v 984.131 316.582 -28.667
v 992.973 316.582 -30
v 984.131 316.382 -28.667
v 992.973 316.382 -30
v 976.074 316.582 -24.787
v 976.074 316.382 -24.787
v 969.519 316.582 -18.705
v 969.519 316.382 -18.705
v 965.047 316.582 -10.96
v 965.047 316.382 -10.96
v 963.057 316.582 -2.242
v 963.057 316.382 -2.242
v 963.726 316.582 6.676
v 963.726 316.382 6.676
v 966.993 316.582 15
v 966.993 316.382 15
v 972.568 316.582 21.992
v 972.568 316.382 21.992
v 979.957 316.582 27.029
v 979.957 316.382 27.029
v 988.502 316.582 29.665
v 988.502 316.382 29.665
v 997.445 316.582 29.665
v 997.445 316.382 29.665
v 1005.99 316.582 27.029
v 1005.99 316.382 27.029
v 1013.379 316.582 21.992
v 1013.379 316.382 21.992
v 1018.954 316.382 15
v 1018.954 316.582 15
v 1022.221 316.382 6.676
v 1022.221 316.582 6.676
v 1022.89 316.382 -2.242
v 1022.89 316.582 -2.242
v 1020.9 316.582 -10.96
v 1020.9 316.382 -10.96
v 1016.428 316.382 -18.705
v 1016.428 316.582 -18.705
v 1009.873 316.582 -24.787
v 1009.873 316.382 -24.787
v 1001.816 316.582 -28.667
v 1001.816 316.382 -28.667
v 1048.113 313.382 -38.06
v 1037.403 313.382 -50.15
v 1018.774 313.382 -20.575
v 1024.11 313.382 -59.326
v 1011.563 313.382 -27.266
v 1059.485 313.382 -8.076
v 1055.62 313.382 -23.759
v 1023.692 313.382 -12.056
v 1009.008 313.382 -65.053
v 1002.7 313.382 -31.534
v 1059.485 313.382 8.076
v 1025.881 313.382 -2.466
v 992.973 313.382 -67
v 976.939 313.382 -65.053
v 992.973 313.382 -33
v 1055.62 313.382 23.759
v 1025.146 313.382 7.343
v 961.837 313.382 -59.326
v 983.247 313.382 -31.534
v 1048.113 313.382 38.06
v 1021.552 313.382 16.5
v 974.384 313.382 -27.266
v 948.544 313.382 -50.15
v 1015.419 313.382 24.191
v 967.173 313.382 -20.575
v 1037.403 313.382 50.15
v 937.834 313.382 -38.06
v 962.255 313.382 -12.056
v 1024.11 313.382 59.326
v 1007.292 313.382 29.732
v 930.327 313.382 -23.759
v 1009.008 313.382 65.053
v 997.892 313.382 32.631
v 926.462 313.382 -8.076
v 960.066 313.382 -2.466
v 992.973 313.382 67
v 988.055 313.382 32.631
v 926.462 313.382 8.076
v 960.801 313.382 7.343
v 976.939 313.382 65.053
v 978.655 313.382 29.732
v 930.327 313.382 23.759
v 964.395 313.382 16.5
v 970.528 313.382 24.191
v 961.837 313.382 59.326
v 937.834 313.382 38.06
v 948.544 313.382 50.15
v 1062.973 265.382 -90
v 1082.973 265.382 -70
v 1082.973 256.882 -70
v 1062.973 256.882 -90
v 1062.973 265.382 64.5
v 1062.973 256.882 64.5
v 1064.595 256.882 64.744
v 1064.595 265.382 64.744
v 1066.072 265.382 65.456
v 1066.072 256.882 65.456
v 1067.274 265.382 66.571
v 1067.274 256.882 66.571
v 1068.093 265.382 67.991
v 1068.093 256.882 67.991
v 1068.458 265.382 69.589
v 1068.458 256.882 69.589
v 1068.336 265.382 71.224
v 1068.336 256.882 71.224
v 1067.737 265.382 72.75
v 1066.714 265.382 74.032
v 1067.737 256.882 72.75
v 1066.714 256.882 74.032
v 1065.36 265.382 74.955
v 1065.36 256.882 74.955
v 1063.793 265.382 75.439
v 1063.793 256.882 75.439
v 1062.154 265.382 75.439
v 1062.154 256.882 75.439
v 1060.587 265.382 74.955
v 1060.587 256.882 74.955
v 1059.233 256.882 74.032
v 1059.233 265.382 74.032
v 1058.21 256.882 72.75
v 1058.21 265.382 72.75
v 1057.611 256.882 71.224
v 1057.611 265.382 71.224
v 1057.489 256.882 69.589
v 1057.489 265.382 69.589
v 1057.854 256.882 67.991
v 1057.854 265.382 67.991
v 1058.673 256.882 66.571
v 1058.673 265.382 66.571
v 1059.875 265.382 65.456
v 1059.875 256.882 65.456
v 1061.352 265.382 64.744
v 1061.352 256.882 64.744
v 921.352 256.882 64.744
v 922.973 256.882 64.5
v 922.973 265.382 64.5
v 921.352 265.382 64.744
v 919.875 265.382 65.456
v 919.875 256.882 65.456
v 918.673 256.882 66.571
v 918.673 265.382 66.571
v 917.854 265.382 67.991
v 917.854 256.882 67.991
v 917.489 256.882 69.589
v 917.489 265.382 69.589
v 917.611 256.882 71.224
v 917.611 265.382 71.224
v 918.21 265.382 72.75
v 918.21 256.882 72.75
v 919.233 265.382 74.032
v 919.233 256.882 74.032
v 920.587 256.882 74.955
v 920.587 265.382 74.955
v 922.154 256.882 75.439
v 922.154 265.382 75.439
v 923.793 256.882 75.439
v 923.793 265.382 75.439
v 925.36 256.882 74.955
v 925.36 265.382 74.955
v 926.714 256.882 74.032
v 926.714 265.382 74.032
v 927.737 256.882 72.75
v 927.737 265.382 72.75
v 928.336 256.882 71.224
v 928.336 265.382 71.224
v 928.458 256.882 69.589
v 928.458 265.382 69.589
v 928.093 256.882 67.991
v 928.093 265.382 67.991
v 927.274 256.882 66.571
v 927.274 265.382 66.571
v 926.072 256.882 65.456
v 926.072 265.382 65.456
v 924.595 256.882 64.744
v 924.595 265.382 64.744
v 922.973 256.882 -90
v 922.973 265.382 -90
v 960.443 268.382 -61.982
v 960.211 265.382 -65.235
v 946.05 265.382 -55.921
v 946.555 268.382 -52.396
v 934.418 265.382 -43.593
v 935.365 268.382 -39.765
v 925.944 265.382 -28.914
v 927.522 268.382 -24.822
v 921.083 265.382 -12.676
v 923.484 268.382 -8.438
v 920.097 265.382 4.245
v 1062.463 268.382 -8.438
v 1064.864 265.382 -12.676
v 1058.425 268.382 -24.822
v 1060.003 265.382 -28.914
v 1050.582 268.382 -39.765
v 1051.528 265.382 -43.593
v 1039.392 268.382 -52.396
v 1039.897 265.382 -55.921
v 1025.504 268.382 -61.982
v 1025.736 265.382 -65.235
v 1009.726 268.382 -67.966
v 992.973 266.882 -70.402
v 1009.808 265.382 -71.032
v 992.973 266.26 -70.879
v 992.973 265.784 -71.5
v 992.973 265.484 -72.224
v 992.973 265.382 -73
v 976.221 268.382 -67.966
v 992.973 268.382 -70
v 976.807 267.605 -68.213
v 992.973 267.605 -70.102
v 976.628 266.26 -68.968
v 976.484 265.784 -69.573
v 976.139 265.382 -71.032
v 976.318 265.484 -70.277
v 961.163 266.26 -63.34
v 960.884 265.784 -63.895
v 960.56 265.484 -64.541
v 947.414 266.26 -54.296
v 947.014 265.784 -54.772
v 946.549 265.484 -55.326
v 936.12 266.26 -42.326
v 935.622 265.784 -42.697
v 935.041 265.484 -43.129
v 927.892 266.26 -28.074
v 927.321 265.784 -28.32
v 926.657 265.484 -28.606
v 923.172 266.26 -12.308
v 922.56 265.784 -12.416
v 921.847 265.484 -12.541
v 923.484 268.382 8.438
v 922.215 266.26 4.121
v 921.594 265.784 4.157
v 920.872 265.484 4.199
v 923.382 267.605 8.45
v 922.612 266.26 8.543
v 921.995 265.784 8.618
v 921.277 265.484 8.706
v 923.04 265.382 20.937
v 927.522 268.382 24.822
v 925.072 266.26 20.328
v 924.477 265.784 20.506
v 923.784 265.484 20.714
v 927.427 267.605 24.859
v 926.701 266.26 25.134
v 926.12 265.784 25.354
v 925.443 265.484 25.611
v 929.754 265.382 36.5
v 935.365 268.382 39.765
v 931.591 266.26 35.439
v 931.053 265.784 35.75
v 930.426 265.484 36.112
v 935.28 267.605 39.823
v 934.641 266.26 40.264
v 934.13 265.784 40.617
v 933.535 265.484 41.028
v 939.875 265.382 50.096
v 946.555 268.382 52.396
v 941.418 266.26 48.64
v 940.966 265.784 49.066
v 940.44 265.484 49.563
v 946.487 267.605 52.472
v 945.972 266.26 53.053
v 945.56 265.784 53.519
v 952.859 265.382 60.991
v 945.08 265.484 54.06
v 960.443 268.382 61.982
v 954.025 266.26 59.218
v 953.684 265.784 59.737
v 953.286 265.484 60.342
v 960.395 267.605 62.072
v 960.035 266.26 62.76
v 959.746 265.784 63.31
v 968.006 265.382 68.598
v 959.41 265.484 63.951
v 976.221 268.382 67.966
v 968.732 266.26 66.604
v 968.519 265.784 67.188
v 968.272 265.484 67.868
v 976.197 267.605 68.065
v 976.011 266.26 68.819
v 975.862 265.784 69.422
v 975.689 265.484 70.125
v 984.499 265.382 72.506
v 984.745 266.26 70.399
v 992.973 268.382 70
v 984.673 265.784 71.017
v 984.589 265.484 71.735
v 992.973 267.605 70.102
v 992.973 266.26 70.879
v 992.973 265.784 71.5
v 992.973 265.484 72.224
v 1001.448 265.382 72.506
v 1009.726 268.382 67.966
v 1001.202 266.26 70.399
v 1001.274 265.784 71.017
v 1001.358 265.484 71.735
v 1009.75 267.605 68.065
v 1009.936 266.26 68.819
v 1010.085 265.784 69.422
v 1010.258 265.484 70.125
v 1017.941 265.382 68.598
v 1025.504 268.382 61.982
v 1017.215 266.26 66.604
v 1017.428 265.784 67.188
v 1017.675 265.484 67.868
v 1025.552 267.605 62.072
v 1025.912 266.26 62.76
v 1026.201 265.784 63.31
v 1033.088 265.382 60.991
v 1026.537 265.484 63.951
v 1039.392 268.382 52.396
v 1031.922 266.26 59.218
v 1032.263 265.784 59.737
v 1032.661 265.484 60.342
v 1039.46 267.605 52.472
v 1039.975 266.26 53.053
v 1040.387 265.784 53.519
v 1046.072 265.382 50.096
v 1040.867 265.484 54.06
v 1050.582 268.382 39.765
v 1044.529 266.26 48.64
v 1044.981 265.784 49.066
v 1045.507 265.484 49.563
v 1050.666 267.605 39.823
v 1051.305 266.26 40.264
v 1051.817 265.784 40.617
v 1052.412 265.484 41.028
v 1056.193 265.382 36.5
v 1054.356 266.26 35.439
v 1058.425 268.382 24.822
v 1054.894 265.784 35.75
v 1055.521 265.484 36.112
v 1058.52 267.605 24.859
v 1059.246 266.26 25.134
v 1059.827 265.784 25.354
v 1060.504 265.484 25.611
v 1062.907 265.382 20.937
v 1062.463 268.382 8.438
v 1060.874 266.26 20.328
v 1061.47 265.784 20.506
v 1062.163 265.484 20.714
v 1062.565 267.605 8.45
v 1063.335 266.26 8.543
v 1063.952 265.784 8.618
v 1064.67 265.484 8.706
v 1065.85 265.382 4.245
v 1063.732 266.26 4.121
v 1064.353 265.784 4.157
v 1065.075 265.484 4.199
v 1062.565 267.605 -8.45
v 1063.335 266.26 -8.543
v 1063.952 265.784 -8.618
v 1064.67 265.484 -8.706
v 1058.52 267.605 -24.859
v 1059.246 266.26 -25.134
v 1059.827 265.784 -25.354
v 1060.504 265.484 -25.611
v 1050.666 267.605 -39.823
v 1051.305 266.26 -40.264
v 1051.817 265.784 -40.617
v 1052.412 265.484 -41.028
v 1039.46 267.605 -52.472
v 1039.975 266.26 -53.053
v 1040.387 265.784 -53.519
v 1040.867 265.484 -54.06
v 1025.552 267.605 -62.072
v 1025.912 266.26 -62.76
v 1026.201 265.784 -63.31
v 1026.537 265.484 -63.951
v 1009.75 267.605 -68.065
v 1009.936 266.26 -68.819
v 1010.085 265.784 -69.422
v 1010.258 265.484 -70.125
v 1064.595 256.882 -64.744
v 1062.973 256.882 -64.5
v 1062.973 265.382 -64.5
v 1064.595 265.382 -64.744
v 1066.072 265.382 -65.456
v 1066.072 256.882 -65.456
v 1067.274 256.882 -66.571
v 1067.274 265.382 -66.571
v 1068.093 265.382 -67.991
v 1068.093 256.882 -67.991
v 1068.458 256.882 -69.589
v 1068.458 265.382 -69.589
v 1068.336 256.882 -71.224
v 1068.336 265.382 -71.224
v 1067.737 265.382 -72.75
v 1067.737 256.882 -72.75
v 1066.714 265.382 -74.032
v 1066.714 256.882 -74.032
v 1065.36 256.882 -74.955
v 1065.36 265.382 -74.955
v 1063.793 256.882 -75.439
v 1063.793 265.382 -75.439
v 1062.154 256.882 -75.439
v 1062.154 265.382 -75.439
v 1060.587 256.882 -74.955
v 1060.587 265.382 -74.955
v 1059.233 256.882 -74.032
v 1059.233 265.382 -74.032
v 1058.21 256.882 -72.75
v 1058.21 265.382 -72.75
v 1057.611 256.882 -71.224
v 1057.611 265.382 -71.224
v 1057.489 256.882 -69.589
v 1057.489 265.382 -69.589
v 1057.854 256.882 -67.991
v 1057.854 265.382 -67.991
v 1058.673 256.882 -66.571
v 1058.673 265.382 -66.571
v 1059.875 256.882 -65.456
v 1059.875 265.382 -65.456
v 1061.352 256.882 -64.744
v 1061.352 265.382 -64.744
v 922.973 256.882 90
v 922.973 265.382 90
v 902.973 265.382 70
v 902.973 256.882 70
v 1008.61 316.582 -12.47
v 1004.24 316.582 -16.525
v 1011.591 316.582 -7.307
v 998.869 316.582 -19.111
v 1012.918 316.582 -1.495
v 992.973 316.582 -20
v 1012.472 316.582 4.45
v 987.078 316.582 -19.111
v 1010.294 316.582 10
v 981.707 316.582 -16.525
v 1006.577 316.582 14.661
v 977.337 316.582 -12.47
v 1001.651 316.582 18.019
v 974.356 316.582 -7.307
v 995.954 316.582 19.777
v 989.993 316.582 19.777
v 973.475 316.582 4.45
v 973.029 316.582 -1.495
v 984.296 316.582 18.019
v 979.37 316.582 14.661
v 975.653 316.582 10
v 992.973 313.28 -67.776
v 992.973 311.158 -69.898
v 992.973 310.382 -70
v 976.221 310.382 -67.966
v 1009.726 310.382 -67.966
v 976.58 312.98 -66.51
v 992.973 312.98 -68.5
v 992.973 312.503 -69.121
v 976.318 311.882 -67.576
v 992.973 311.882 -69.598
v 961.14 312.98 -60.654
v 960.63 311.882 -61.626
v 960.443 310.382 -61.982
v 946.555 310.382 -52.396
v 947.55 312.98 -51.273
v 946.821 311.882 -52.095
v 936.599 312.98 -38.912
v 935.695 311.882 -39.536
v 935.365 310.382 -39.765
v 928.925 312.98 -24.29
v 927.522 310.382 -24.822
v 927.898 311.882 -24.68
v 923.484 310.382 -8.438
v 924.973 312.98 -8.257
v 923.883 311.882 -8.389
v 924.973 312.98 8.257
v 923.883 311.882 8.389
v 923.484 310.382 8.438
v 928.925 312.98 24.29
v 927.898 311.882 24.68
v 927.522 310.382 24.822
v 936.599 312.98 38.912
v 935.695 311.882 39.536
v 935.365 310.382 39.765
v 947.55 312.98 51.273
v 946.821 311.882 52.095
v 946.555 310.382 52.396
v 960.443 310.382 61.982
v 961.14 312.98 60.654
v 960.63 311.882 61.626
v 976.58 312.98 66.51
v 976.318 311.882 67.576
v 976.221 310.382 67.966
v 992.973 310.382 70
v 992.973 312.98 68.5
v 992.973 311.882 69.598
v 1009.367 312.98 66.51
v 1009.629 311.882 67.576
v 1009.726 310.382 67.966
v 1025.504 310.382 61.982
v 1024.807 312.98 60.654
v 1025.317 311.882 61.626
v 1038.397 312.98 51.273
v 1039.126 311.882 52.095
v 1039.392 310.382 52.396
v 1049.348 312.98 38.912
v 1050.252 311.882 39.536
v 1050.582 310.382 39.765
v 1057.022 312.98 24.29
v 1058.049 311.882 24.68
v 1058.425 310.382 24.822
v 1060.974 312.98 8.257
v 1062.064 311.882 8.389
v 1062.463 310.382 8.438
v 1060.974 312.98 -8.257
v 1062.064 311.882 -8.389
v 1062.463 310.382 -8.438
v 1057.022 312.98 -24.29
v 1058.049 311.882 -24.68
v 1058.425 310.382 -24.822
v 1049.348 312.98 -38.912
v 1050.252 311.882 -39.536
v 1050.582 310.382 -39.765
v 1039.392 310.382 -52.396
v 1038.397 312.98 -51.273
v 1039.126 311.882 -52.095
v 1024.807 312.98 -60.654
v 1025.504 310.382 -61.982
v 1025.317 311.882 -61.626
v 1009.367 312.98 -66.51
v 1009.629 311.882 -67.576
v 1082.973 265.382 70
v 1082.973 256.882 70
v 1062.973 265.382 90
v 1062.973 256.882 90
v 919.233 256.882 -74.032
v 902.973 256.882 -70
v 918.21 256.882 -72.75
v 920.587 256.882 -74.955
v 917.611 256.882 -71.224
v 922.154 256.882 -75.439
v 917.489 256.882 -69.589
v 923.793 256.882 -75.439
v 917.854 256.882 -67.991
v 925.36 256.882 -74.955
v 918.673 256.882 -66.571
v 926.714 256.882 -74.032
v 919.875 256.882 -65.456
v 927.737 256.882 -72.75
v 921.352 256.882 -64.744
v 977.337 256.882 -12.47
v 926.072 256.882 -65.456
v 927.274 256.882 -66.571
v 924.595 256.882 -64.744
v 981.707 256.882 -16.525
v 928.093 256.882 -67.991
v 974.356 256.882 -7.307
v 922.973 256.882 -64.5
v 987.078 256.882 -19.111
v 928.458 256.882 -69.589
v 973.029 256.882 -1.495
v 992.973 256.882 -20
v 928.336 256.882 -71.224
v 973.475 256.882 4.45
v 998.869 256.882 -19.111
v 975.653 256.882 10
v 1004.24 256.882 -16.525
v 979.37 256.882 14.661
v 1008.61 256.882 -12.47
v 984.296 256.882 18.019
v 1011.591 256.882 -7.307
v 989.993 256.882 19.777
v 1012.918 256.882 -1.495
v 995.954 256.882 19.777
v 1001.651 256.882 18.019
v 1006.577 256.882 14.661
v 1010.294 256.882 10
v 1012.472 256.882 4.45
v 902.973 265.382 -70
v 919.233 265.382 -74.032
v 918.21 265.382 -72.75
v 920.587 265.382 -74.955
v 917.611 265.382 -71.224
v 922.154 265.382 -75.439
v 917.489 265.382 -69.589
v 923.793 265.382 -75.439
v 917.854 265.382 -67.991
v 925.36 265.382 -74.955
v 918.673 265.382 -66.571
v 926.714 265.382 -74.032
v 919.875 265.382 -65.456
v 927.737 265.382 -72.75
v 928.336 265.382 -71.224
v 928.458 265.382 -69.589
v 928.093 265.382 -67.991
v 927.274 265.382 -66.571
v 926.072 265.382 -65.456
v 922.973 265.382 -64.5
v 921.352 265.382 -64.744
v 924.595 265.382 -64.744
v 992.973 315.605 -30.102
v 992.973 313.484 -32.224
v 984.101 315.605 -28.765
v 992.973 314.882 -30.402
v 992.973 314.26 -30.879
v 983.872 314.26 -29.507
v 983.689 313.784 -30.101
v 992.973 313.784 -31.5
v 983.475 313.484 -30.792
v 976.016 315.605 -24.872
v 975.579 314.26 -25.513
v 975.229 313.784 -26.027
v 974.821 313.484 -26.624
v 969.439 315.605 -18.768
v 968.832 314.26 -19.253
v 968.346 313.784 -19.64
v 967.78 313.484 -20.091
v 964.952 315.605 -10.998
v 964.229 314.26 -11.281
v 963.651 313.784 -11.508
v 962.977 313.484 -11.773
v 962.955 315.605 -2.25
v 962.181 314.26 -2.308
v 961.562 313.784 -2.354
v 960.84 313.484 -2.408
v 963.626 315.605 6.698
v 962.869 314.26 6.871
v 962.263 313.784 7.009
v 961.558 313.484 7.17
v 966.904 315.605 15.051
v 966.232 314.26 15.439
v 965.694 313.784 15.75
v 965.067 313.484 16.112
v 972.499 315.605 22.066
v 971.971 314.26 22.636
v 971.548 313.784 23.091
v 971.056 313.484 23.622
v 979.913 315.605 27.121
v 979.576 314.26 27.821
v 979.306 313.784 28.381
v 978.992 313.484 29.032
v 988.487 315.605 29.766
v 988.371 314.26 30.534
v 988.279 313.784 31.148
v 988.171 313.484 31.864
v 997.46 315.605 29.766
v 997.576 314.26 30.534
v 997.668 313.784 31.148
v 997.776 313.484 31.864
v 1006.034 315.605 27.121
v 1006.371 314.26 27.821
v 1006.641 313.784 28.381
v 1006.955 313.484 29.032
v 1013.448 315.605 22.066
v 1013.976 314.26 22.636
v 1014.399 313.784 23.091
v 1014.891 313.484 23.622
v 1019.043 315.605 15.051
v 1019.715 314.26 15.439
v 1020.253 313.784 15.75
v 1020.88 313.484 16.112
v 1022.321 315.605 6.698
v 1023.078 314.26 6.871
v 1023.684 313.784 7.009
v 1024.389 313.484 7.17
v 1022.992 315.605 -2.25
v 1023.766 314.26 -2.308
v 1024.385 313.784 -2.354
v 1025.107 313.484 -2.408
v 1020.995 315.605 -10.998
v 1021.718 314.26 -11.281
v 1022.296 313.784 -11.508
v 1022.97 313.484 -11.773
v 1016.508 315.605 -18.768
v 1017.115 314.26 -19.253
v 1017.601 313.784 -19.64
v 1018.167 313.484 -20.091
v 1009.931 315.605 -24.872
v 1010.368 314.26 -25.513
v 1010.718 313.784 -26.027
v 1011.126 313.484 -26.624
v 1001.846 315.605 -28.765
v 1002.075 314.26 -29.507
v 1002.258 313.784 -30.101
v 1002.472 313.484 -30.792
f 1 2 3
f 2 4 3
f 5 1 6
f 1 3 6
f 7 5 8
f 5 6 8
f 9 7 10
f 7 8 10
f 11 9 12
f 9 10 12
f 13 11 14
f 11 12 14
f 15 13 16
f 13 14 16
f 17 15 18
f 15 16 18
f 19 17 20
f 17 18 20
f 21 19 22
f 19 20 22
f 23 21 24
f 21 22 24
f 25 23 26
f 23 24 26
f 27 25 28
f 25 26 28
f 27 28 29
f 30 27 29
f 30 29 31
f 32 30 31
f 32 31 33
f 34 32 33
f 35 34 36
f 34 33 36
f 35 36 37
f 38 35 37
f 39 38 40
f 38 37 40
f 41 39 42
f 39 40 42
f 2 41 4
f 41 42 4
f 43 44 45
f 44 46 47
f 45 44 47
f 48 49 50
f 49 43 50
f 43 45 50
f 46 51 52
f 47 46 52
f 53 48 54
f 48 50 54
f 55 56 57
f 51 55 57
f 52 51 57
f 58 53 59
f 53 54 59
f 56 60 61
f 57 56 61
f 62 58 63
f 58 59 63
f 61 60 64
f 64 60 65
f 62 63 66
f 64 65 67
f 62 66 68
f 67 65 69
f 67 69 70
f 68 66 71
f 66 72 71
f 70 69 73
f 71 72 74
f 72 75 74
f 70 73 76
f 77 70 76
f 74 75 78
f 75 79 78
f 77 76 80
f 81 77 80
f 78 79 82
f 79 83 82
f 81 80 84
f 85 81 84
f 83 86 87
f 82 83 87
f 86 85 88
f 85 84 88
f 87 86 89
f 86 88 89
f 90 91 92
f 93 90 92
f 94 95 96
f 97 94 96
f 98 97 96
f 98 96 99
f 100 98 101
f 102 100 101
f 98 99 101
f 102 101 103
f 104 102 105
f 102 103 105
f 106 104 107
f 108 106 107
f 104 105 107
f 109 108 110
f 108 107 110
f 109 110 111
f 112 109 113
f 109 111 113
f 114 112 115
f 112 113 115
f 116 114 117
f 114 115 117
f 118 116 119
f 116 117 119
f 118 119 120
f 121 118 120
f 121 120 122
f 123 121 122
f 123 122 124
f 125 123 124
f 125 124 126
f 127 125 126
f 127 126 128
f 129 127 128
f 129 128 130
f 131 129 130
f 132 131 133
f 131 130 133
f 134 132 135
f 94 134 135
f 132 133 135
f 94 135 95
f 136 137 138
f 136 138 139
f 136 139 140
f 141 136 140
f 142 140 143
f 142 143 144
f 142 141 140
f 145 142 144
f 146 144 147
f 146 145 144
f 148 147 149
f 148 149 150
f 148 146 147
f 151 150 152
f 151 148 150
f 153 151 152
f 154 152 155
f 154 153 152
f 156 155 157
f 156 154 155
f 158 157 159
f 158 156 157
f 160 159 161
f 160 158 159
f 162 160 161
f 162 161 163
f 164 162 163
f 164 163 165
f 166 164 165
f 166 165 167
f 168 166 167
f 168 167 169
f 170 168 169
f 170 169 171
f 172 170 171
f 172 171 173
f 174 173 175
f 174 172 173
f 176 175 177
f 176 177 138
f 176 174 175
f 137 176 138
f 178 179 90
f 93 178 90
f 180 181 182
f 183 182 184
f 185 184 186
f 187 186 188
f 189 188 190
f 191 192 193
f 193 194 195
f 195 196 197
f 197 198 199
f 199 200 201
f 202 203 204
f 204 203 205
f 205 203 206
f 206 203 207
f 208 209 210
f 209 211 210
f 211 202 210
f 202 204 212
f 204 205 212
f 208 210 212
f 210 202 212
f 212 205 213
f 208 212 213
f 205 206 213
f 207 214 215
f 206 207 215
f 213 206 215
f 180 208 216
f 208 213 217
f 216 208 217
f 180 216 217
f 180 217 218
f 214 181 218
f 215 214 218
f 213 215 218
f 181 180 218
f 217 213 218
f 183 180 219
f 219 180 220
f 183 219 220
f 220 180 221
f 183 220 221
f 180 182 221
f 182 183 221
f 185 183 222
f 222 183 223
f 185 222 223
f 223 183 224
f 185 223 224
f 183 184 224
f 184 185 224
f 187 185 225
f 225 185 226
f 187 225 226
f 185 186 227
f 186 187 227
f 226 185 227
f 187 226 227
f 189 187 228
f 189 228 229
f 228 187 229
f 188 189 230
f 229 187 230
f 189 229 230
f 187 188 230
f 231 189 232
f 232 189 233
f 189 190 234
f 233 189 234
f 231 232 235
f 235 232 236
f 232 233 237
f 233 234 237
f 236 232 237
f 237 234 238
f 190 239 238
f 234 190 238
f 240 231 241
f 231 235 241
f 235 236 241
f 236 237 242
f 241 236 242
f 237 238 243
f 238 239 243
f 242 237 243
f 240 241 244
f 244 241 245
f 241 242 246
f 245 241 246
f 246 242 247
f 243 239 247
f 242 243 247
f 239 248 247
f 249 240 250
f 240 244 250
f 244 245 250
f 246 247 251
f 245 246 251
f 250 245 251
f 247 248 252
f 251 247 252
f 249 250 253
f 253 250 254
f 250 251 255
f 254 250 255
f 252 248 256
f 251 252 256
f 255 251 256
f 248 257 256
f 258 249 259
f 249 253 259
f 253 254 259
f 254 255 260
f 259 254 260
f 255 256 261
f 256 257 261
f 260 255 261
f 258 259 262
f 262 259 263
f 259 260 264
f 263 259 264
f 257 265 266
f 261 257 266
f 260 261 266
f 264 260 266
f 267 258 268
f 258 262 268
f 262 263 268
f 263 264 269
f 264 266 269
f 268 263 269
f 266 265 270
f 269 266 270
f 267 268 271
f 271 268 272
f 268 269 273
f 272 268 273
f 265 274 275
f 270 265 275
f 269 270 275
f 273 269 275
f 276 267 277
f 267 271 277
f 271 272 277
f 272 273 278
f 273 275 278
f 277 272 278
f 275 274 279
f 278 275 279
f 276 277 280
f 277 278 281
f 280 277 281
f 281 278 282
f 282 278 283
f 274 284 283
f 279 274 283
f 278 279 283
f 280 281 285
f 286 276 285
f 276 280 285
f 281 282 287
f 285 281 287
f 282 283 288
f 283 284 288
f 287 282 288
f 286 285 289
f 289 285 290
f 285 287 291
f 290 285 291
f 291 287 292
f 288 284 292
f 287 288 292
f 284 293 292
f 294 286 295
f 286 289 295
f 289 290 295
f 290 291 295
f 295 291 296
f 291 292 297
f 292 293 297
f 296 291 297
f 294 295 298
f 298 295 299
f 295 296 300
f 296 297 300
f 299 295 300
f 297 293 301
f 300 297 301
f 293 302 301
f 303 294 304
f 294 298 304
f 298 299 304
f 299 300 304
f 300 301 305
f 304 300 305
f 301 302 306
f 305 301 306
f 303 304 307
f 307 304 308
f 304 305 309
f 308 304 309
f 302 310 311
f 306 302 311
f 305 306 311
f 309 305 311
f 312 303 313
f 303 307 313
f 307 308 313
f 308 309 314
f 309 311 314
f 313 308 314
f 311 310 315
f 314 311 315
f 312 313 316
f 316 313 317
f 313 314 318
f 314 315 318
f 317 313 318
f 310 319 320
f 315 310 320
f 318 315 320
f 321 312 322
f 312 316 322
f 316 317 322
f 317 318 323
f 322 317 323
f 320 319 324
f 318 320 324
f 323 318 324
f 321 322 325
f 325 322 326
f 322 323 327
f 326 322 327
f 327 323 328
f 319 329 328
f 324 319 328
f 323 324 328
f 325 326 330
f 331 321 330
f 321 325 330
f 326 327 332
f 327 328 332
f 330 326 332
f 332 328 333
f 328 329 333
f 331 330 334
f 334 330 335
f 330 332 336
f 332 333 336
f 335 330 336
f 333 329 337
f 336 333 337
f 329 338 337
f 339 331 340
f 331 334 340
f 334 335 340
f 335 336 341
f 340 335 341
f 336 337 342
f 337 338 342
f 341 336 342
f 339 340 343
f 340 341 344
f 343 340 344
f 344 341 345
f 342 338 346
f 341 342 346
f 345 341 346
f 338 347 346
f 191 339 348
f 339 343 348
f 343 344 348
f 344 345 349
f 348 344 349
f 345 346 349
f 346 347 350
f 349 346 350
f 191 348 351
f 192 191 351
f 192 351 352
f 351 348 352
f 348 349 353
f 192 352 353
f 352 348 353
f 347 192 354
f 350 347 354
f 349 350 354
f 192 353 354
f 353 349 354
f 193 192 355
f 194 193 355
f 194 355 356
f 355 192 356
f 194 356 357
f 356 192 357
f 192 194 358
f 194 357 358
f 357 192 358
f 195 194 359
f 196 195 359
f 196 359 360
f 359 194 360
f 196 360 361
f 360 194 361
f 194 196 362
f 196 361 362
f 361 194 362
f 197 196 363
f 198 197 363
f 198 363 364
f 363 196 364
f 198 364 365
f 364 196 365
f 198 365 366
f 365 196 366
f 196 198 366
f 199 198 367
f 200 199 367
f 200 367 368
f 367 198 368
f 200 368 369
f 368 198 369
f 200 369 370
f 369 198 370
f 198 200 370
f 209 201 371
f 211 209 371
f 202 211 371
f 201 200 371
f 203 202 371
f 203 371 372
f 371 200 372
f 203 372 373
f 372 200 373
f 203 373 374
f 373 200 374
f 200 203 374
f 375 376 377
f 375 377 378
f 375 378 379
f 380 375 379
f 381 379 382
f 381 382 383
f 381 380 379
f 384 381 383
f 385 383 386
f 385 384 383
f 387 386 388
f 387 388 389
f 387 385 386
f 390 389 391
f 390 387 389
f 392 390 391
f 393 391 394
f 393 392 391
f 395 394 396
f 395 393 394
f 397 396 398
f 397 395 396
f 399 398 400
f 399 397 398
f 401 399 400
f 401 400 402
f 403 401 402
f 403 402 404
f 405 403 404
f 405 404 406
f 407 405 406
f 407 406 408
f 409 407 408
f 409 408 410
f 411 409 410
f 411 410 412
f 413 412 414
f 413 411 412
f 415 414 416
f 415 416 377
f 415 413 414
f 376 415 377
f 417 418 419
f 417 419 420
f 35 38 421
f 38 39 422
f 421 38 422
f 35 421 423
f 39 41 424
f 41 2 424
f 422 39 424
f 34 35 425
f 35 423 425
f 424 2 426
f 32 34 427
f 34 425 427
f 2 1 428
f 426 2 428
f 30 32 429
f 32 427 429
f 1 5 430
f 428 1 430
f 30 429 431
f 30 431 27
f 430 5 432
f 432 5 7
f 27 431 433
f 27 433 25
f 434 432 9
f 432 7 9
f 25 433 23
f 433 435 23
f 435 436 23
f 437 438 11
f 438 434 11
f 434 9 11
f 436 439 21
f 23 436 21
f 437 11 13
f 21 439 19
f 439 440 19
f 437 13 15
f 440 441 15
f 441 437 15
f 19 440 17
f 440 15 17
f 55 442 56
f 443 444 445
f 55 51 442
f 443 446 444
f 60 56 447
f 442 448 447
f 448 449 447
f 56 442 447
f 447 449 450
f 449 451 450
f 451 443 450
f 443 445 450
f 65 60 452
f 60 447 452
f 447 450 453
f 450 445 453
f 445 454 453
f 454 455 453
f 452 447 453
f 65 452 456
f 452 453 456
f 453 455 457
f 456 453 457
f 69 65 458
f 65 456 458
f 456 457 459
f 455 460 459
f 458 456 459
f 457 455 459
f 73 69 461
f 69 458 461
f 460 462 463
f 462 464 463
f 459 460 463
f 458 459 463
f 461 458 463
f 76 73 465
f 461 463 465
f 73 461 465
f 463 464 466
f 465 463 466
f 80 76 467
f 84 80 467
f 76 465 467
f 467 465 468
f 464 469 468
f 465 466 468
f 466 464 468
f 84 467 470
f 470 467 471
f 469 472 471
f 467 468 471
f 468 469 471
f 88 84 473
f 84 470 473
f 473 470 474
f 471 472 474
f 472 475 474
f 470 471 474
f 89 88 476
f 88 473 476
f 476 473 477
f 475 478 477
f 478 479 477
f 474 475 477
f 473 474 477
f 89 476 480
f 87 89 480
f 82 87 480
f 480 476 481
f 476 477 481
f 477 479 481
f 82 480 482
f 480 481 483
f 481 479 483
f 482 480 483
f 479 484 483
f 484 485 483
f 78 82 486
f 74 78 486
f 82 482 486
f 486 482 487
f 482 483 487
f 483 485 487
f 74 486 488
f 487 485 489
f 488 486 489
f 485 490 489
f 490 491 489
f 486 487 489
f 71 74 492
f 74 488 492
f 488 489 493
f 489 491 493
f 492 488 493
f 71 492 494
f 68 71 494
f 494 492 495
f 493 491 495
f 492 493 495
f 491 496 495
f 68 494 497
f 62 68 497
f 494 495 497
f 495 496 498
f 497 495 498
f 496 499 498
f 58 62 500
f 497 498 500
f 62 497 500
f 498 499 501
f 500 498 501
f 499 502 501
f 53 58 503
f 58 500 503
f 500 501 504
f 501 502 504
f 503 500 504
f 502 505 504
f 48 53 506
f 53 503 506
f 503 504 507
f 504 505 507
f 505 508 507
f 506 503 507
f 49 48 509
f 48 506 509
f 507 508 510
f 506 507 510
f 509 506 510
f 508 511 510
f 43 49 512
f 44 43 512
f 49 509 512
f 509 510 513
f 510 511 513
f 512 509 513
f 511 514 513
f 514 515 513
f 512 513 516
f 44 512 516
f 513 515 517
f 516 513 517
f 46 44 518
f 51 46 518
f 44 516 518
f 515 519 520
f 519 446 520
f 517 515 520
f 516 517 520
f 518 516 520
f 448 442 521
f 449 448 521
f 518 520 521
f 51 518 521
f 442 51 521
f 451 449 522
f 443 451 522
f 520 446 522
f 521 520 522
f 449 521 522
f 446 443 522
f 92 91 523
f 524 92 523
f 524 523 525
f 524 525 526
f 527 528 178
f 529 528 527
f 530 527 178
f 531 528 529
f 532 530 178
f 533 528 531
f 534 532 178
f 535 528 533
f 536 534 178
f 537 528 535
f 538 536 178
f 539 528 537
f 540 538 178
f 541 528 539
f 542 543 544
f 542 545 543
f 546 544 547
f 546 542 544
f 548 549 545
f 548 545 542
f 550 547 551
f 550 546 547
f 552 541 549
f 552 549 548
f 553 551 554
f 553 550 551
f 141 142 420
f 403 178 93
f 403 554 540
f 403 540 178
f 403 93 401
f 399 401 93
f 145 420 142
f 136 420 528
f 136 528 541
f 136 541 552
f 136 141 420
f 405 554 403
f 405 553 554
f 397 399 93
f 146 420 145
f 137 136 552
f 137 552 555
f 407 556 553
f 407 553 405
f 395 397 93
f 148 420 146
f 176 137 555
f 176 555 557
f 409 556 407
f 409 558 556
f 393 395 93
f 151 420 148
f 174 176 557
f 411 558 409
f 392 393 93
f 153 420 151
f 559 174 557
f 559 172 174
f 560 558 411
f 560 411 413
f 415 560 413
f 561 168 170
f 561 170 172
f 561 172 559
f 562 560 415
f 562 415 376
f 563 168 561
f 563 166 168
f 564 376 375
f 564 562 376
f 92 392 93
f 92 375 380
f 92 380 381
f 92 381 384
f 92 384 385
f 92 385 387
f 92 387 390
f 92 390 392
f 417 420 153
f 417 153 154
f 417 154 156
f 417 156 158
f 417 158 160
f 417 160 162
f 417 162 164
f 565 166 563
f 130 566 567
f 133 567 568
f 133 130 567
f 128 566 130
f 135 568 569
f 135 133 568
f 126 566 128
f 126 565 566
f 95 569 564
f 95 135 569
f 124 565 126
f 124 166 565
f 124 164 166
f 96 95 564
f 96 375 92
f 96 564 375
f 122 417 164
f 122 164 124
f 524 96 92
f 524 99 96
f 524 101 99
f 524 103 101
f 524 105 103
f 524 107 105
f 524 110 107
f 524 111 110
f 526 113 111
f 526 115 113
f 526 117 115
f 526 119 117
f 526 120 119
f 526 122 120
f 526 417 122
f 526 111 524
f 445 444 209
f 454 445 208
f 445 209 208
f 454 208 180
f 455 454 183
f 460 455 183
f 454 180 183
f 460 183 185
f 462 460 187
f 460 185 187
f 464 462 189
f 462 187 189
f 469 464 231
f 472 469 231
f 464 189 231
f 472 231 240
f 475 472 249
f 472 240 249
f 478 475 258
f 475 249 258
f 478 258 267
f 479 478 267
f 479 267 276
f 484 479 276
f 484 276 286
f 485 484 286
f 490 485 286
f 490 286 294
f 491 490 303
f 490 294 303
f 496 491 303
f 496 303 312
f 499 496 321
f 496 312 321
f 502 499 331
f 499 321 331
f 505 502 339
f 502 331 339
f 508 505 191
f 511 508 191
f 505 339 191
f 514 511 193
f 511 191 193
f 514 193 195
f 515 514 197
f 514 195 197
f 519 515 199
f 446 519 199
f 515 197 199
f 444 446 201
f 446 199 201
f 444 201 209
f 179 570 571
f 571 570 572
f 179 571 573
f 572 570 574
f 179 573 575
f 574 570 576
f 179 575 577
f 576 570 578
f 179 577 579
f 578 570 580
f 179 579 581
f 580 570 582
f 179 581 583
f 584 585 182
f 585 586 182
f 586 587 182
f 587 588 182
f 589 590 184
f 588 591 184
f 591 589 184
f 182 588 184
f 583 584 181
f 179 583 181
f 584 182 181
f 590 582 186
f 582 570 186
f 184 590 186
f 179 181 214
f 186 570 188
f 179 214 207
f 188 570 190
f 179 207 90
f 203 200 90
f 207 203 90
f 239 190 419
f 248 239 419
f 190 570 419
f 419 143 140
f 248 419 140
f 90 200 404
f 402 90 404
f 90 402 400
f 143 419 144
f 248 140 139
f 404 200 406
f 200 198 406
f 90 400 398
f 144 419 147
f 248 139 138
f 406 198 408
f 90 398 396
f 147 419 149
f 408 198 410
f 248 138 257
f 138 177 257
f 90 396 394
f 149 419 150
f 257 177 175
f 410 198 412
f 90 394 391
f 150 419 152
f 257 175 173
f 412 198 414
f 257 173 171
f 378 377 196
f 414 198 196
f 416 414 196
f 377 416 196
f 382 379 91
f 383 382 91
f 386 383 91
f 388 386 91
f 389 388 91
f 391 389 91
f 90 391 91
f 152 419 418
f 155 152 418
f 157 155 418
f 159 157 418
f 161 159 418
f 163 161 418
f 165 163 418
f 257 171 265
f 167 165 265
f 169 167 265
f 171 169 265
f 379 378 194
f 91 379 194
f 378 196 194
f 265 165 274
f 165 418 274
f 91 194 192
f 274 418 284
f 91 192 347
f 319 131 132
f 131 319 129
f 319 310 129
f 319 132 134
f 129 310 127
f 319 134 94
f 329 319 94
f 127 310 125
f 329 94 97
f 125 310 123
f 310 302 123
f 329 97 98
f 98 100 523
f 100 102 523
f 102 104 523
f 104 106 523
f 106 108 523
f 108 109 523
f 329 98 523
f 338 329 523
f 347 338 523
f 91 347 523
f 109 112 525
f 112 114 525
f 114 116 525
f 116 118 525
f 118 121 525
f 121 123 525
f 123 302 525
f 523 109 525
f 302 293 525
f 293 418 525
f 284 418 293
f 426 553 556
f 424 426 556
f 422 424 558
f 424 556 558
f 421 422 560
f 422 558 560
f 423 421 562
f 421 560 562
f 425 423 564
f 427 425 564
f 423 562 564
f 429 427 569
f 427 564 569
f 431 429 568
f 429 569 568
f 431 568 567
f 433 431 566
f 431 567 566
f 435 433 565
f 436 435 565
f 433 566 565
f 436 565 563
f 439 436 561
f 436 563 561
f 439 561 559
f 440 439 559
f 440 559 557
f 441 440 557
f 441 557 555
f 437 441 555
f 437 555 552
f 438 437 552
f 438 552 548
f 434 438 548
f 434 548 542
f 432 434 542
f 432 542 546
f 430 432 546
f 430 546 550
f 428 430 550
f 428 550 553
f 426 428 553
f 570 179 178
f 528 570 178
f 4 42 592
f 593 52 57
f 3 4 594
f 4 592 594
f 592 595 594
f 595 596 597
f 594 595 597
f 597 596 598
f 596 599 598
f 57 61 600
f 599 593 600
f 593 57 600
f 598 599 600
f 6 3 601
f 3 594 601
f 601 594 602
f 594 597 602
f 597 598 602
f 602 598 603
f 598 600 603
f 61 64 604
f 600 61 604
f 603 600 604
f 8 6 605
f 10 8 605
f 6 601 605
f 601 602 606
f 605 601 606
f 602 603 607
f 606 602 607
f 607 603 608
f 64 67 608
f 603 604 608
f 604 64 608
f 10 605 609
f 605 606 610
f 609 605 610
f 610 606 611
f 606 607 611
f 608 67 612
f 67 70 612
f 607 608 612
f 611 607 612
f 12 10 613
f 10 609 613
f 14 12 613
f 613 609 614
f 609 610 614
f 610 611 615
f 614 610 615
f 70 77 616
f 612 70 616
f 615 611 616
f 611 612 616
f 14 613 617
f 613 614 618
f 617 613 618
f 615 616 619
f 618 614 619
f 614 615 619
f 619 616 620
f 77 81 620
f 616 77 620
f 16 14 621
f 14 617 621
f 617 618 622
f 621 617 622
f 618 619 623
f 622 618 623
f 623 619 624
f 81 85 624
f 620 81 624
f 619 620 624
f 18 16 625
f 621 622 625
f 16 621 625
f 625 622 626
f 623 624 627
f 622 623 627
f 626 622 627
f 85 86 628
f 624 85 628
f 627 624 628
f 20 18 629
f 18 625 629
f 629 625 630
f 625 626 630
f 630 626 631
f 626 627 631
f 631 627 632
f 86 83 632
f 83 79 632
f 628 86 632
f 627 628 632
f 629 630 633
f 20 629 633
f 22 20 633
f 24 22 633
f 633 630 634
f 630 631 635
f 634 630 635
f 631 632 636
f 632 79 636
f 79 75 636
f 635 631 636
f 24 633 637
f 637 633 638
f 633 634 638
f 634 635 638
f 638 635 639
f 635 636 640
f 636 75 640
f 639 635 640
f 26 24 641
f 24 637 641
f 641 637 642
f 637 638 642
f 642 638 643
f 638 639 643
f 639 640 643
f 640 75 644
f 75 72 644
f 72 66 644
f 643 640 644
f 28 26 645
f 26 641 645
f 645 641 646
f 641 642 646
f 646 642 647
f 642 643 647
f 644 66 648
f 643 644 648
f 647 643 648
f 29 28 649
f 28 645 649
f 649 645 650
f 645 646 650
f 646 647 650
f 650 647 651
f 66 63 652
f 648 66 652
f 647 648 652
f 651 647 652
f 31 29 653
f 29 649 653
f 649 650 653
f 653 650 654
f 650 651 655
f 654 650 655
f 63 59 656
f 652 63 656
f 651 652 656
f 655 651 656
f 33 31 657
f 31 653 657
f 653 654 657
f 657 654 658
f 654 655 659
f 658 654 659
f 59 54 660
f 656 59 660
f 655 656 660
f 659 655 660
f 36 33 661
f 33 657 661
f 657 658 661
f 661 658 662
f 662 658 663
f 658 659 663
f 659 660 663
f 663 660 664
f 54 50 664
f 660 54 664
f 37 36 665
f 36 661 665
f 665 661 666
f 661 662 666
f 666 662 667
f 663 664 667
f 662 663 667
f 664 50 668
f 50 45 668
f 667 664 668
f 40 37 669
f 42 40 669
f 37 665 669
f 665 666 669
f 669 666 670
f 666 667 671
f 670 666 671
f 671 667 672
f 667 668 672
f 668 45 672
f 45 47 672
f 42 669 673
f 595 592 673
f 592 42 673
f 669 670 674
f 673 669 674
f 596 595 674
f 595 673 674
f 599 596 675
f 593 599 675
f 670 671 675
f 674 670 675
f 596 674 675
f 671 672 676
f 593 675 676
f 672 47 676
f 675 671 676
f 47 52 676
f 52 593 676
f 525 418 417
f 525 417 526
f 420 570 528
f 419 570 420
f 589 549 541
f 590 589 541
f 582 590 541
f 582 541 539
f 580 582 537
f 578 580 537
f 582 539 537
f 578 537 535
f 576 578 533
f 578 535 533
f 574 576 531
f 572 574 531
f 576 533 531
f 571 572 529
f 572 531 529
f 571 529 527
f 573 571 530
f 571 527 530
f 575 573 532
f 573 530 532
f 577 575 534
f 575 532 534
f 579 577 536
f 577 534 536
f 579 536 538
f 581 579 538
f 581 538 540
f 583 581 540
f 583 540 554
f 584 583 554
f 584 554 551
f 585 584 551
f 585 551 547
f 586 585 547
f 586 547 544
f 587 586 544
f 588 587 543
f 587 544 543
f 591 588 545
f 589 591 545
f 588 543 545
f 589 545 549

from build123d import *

# Parameters (mm, degrees)
SKETCH_2_W               = 180
SKETCH_2_H               = 180
EXTRUDE_1_DEPTH          = 8.5
CHAMFER_1_SIZE           = 20
SKETCH_4_R               = 5.5
CUT_EXTRUDE_1_DEPTH      = 8.5
MIRROR_2_COPY_1_SKETCH_R = 5.5
MIRROR_2_COPY_1_DEPTH    = 8.5
SKETCH_5_R               = 20
CUT_EXTRUDE_2_DEPTH      = 1089.345359905


with BuildPart() as part:
    # 草图1 → 旋转1 (revolve)
    with BuildSketch(Plane.XY, mode=Mode.PRIVATE) as revolve_1_sk:
        with BuildLine():
            ThreePointArc((922.973468016, 268.381765717), (922.094788359, 266.260445373), (919.973468016, 265.381765717))
            Line((919.973468016, 265.381765717), (922.973468016, 265.381765717))
            Line((922.973468016, 265.381765717), (992.973468016, 265.381765717))
            Line((992.973468016, 265.381765717), (992.973468016, 313.381765717))
            Line((992.973468016, 313.381765717), (959.973468016, 313.381765717))
            Line((959.973468016, 313.381765717), (925.973468016, 313.381765717))
            ThreePointArc((925.973468016, 313.381765717), (923.852147672, 312.50308606), (922.973468016, 310.381765717))
            Line((922.973468016, 310.381765717), (922.973468016, 268.381765717))
        make_face()
        with BuildLine():
            Line((959.973468016, 313.381765717), (992.973468016, 313.381765717))
            Line((992.973468016, 313.381765717), (992.973468016, 316.581765717))
            Line((992.973468016, 316.581765717), (962.973468016, 316.581765717))
            Line((962.973468016, 316.581765717), (962.973468016, 316.381765717))
            ThreePointArc((962.973468016, 316.381765717), (962.094788359, 314.260445373), (959.973468016, 313.381765717))
        make_face()
    revolve(revolve_1_sk.sketch.rotate(Axis((992.973468016, 256.881765717, 0), (0, 1, 0)), 270), axis=Axis((992.973468016, 256.881765717, 0), (0, 1, 0)))

    # 草图2 → 凸台-拉伸1 (add)
    with BuildSketch(Plane.XZ.offset(-265.381765717)):
        with Locations((992.973468016, 0)):
            Rectangle(SKETCH_2_W, SKETCH_2_H)
    extrude(amount=EXTRUDE_1_DEPTH)

    # 倒角1
    chamfer_1_edges = [part.edges().sort_by_distance(p)[0] for p in [
        (1082.973468016, 261.131765717, -90),
        (1082.973468016, 261.131765717, 90),
        (902.973468016, 261.131765717, 90),
        (902.973468016, 261.131765717, -90),
    ]]
    chamfer(chamfer_1_edges, length=CHAMFER_1_SIZE)

    # 草图4 → 切除-拉伸1 (cut)
    with BuildSketch(Plane.XZ.offset(-256.881765717)):
        with Locations(Location((1062.973468016, 70, 0), (0, 0, 270))):
            Circle(SKETCH_4_R)
    cut_extrude_1 = extrude(amount=-CUT_EXTRUDE_1_DEPTH, mode=Mode.SUBTRACT)

    # 镜向1: 切除-拉伸1 across plane
    add(cut_extrude_1.mirror(Plane.XY), mode=Mode.SUBTRACT)

    # 镜向2: 切除-拉伸1 across plane
    add(cut_extrude_1.mirror(Plane.ZY.offset(-992.973468016)), mode=Mode.SUBTRACT)

    # 镜向2 copy 1 sketch → 镜向2 copy 1 (cut)
    with BuildSketch(Plane(origin=(1985.946936032, 256.881765717, 0), x_dir=(-1, 0, 0), z_dir=(0, -1, 0))):
        with Locations(Location((1062.973468016, 70, 0), (0, 0, 270))):
            Circle(MIRROR_2_COPY_1_SKETCH_R)
    extrude(amount=-MIRROR_2_COPY_1_DEPTH, mode=Mode.SUBTRACT)

    # 草图5 → 切除-拉伸2 (cut, through all)
    with BuildSketch(Plane.XZ.offset(-256.881765717)):
        with Locations(Location((992.973468016, 0, 0), (0, 0, 270))):
            Circle(SKETCH_5_R)
    extrude(amount=-CUT_EXTRUDE_2_DEPTH, mode=Mode.SUBTRACT)


solid = part.part
